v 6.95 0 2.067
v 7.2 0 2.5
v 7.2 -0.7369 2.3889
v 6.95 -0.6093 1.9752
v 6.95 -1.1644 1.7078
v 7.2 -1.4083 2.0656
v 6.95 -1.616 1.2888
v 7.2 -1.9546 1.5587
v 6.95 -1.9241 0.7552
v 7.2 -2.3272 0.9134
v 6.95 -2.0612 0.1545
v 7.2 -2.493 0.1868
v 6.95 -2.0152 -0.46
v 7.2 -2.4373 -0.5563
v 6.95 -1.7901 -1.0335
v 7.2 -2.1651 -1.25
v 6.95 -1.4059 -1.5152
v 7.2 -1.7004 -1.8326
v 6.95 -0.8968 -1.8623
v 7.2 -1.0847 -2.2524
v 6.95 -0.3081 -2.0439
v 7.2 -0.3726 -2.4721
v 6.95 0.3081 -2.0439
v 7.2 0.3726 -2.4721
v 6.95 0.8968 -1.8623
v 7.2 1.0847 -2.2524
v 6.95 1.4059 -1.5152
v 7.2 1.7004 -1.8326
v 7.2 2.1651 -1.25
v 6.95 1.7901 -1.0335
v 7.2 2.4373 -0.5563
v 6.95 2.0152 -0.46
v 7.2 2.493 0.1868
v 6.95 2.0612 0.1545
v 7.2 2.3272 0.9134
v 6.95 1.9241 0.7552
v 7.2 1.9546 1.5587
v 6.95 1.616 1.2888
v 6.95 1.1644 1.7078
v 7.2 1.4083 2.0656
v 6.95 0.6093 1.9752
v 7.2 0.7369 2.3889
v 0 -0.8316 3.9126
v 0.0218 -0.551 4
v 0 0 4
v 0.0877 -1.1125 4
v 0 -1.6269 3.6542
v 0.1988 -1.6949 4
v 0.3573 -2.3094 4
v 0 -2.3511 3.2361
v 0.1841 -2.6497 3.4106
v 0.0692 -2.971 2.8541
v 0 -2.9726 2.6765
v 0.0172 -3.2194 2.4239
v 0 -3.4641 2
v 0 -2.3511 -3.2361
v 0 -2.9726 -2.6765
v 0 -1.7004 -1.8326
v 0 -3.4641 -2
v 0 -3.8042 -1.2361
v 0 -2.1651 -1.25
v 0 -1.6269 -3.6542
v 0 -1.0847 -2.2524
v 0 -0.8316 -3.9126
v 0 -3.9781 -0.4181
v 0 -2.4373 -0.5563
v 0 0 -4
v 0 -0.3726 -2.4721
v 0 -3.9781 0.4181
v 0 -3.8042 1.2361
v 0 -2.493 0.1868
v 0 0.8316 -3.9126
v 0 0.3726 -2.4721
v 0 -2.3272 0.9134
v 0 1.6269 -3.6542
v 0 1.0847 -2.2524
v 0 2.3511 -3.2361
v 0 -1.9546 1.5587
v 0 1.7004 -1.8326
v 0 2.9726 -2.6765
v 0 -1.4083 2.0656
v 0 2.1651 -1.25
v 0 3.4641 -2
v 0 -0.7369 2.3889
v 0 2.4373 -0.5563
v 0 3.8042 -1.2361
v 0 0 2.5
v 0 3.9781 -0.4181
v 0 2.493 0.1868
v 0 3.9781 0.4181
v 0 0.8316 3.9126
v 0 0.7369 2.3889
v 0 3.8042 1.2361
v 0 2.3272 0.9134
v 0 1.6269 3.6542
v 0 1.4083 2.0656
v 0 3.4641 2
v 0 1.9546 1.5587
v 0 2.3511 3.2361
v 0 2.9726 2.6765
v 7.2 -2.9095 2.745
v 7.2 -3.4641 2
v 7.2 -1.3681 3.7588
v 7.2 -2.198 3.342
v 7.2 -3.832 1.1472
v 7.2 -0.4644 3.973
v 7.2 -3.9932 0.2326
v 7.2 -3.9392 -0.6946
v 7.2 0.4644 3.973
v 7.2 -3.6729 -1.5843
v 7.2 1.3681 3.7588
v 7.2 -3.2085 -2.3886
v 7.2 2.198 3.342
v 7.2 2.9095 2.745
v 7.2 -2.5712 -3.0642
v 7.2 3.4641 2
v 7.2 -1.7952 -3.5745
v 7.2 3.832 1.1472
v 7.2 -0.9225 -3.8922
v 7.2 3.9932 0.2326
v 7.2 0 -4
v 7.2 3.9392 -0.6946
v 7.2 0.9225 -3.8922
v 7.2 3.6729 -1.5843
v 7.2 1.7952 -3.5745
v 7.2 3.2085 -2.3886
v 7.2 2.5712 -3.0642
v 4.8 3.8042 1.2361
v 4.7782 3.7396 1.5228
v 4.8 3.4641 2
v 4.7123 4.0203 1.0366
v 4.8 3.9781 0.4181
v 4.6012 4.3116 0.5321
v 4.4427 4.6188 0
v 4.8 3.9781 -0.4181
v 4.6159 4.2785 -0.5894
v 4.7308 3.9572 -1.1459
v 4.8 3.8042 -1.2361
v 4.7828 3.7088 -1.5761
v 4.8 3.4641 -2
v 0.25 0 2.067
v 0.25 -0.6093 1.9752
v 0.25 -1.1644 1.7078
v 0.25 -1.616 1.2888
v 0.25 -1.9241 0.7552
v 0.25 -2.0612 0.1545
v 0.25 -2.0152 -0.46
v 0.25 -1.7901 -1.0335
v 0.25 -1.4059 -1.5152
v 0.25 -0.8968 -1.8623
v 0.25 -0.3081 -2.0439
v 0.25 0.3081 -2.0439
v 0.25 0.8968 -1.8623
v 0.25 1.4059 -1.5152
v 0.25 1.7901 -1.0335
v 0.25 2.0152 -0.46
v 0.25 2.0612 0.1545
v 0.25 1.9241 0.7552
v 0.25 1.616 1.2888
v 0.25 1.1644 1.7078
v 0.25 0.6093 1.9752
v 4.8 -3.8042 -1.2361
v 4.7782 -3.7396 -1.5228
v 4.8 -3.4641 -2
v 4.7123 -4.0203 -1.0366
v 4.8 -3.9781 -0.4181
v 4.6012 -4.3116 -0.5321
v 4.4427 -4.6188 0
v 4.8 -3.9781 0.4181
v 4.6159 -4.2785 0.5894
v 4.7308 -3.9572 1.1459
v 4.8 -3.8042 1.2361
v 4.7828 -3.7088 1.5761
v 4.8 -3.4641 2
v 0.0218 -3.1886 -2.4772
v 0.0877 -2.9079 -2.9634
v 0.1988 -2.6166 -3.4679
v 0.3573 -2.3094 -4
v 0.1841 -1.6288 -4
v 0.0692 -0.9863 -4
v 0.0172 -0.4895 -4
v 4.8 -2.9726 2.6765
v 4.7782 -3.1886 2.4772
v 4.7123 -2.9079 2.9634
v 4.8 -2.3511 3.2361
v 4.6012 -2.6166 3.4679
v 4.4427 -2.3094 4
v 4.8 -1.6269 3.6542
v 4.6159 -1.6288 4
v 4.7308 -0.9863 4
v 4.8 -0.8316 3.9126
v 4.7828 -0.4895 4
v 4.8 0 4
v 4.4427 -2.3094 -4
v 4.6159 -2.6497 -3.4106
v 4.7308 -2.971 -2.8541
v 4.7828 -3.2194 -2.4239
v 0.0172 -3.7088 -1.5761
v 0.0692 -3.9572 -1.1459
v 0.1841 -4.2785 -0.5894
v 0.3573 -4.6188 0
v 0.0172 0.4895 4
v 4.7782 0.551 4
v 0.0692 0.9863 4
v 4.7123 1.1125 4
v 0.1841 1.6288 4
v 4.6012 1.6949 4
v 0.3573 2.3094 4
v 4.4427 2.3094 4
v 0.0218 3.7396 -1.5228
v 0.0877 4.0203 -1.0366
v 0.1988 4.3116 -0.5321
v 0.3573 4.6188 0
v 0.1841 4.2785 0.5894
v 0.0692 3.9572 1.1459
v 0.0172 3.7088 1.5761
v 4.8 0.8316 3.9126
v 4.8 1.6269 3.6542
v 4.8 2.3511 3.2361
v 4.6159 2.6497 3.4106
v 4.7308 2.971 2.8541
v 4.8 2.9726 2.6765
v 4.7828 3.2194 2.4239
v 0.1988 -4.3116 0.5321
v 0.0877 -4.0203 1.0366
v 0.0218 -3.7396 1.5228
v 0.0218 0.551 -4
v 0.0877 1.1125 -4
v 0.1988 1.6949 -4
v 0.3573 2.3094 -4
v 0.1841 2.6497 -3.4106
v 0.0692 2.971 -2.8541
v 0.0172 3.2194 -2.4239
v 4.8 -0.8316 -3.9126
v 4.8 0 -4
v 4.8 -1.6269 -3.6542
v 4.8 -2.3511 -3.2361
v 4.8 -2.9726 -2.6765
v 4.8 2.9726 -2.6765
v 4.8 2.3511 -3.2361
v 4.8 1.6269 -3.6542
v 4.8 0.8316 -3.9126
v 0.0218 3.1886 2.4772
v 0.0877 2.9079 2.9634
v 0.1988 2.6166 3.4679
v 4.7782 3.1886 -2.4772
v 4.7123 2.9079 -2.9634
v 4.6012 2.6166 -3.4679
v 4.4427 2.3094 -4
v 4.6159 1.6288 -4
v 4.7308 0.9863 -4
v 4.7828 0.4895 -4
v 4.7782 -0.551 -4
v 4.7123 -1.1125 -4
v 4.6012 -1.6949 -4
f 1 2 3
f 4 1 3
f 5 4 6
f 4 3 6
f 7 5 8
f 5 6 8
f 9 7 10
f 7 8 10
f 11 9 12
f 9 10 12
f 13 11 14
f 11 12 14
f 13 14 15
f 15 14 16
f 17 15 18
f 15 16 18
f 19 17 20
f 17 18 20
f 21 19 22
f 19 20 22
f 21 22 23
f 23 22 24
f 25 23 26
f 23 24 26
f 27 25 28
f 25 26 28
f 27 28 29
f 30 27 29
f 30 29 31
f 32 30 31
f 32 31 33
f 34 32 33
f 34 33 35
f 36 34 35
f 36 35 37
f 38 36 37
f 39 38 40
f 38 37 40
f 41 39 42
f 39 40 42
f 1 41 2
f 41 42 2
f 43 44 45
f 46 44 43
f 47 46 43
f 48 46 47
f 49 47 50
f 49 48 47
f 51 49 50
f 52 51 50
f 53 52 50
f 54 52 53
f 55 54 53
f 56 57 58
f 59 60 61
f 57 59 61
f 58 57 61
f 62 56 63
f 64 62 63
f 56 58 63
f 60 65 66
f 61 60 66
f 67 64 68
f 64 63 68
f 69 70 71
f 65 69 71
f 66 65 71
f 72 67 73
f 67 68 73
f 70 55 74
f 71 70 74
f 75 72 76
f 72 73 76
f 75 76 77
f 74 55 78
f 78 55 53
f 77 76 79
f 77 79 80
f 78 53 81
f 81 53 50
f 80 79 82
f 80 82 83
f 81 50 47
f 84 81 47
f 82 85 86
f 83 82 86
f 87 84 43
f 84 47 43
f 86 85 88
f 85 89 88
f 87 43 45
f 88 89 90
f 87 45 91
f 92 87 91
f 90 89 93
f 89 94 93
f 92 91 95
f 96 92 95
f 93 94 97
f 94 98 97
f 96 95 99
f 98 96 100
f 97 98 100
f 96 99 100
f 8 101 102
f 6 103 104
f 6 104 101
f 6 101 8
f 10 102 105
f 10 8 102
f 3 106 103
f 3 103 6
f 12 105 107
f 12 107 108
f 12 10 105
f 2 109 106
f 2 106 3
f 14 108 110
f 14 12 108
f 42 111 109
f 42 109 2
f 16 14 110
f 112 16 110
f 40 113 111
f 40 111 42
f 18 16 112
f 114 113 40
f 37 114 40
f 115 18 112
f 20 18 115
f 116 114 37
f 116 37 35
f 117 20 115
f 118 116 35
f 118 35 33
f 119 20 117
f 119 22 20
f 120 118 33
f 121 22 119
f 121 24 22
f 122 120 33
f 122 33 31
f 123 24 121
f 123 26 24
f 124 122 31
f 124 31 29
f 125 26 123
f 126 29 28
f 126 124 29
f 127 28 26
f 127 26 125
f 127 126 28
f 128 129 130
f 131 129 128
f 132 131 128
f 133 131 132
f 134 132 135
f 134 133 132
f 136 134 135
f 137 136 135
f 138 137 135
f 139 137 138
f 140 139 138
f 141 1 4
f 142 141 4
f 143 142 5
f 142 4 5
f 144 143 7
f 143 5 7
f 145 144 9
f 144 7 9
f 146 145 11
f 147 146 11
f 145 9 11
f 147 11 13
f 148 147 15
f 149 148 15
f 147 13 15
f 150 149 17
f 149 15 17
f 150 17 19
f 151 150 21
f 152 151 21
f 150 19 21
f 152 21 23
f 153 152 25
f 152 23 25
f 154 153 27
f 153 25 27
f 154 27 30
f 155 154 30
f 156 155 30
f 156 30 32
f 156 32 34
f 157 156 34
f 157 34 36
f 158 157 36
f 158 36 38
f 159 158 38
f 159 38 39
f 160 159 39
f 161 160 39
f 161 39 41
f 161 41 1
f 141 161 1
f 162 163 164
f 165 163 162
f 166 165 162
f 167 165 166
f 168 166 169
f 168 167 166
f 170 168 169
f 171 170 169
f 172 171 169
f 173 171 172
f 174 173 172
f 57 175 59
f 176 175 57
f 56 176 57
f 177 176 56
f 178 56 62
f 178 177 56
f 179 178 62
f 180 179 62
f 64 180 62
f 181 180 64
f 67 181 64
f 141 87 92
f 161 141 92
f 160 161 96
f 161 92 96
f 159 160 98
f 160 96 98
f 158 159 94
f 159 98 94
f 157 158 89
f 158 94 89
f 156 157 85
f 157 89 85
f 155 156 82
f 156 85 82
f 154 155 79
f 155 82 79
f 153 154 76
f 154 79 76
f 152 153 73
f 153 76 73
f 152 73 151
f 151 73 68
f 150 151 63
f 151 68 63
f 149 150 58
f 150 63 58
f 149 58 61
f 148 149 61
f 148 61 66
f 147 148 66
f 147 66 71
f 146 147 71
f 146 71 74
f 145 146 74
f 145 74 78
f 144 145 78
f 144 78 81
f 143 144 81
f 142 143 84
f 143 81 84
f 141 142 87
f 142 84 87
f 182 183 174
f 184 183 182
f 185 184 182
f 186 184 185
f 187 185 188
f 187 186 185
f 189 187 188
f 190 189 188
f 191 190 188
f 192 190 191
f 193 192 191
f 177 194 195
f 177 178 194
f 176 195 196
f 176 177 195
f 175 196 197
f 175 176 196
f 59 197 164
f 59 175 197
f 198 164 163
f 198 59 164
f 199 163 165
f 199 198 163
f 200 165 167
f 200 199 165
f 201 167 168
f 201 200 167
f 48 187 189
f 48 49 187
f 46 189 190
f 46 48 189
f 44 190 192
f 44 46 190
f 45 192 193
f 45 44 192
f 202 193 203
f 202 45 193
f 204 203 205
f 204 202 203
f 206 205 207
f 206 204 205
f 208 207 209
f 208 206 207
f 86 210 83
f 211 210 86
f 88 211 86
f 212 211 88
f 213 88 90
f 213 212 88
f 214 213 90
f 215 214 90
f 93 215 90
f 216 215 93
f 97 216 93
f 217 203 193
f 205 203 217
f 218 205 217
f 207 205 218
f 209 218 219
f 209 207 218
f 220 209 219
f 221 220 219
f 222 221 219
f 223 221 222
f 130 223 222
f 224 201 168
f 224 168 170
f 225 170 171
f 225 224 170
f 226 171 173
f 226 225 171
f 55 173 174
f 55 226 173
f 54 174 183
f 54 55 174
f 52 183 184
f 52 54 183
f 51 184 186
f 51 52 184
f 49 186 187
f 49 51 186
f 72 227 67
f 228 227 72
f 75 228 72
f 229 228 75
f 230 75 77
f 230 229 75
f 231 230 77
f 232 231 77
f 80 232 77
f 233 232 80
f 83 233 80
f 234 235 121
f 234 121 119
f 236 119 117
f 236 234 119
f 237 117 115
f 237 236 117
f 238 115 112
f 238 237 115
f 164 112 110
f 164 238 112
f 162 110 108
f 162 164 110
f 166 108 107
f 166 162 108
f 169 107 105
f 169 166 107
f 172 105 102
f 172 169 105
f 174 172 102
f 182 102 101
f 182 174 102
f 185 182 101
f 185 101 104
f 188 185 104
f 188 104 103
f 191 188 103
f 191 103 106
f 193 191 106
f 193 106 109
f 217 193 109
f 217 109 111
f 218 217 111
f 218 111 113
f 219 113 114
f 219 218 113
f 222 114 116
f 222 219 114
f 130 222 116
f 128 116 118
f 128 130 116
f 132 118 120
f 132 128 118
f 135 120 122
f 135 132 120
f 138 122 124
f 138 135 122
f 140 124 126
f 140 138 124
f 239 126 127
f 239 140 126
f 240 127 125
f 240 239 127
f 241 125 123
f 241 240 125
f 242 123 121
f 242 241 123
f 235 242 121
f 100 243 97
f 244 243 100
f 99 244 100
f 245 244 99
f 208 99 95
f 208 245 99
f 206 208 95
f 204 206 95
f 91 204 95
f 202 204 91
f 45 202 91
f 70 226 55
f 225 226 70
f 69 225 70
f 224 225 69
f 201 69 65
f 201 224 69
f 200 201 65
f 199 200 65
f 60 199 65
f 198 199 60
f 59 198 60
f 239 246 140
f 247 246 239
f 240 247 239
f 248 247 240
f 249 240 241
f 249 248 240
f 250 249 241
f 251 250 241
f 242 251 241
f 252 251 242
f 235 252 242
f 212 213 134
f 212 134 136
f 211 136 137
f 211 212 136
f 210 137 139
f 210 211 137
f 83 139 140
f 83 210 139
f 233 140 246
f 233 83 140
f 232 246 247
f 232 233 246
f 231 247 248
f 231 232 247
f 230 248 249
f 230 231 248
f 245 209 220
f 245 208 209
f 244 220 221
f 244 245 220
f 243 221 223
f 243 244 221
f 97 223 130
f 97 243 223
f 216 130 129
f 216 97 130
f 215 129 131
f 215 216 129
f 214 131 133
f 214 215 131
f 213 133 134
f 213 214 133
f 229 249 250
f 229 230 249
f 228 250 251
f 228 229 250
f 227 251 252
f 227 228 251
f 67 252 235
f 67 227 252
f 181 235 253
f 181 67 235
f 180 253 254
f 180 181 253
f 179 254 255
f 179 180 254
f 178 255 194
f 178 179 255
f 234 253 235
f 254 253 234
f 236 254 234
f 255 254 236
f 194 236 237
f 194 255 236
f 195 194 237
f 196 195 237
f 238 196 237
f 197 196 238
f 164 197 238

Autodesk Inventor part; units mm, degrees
ref_plane "YZ Plane" through (0, 0, 0) normal (1, 0, 0) x (0, 1, 0)
ref_plane "XZ Plane" through (0, 0, 0) normal (0, 1, 0) x (-1, 0, 0)
sketch "Sketch1" plane through (0, 0, 0) normal (1, 0, 0) x (0, 1, 0)
  line L0 (2.3094, -4) -> (-2.3094, -4)
  line L1 (-2.3094, -4) -> (-4.6188, 0)
  line L2 (-4.6188, 0) -> (-2.3094, 4)
  line L3 (-2.3094, 4) -> (2.3094, 4)
  line L4 (2.3094, 4) -> (4.6188, 0)
  line L5 (4.6188, 0) -> (2.3094, -4)
  point P0 (0, 0)
  point P1 (0, 0)
  dimension "d0" = 9.2376
extrude "Body" add sketch "Sketch1" along normal blind 4.8
sketch "Sketch2" plane through (4.8, 0, 0) normal (1, 0, 0) x (0, 0, -1)
  circle A0 centre (0, 0) radius 4
  dimension "d7" = 8
extrude "Ring" add sketch "Sketch2" along normal blind 2.4
sketch "Sketch3" plane through (0, 0, 0) normal (0, 0, 1) x (1, 0, 0)
  line L0 (0, 2.3094) -> (0, 4.6188) projected
  line L1 (0, 4.6188) -> (4.8, 4.6188) projected
  line L2 (4.8, 2.3094) -> (4.8, 4.6188) projected
  line L3 (-0.96, 0) -> (5.76, 0) projected
  line L4 (0, 4) -> (0.3573, 4.6188)
  line L5 (4.4427, 4.6188) -> (4.8, 4)
  dimension "d3" = 30
  dimension "d4" = 30
  dimension "d5" = 8
  dimension "d6" = 8
revolve "Chamfer1" cut sketch "Sketch3" angle 360 about axis through (-10, 0, 0) along (1, 0, 0)
sketch "Sketch4" plane through (0, 0, 0) normal (-1, 0, 0) x (0, 0, 1)
  line L0 (0, -6.4663) -> (0, 6.4663) projected
  line L1 (-5.6, 0) -> (5.6, 0) projected
  point P0 (0, 0)
hole "Thread" at (0, 0, 0) direction (1, 0, 0) diameter 4.134 end through all thread size "M5x0.8" class "6H" standard "ISO Metric profile"
chamfer "Chamfer2" distance 0.433 angle 30 1 edges at (0, 0, -2.067) measured on face at (0, -3.336, 0.083)
chamfer "Chamfer3" distance 0.433 angle 30 1 edges at (7.2, 0, -2.067) measured on face at (7.2, -0.484, -3.2969)
ref_plane "Work Plane1" through (14.1836, 0, 0) normal (0, 0, 1) x (-1, 0, 0)
equation "\"d0\" = 1.1547 * SW"
equation "\"d1\" = KOH1"
equation "\"d7\" = SD2"
equation "\"d8\" = KOH - KOH1"
equation "\"d3\" = ANG1"
equation "\"d4\" = ANG2"
equation "\"d5\" = SW0"
equation "\"d6\" = SW01"
equation "\"d10\" = -0.5 * GD1 + 0.5 * NND"
equation "\"d46\" = -0.5 * GD1 + 0.5 * NND"
equation "\"d12\" = -0.5 * GD1 + 0.5 * NND"
equation "\"d47\" = -0.5 * GD1 + 0.5 * NND"
equation "\"ANG1\" = 30deg"
equation "\"ANG2\" = 30deg"
equation "\"NND\" = 5"
equation "\"KOH1\" = 4.8"
equation "\"KOH\" = 7.2"
equation "\"SW\" = 8"
equation "\"SW0\" = SW"
equation "\"SW01\" = SW"
equation "\"SD2\" = SW"
equation "\"GUL\" = 0.541266 * PTC"
equation "\"THREADDIA\" = 5"
equation "\"TOA\" = 30deg"
equation "\"PTC\" = 0.8"
equation "\"GAL\" = 0.541266 * PTC"
equation "\"E0\" = 1.155 * SW"
equation "\"GD1\" = 4.133975"
properties part number "ISO 7041 - M5" material "Steel"
